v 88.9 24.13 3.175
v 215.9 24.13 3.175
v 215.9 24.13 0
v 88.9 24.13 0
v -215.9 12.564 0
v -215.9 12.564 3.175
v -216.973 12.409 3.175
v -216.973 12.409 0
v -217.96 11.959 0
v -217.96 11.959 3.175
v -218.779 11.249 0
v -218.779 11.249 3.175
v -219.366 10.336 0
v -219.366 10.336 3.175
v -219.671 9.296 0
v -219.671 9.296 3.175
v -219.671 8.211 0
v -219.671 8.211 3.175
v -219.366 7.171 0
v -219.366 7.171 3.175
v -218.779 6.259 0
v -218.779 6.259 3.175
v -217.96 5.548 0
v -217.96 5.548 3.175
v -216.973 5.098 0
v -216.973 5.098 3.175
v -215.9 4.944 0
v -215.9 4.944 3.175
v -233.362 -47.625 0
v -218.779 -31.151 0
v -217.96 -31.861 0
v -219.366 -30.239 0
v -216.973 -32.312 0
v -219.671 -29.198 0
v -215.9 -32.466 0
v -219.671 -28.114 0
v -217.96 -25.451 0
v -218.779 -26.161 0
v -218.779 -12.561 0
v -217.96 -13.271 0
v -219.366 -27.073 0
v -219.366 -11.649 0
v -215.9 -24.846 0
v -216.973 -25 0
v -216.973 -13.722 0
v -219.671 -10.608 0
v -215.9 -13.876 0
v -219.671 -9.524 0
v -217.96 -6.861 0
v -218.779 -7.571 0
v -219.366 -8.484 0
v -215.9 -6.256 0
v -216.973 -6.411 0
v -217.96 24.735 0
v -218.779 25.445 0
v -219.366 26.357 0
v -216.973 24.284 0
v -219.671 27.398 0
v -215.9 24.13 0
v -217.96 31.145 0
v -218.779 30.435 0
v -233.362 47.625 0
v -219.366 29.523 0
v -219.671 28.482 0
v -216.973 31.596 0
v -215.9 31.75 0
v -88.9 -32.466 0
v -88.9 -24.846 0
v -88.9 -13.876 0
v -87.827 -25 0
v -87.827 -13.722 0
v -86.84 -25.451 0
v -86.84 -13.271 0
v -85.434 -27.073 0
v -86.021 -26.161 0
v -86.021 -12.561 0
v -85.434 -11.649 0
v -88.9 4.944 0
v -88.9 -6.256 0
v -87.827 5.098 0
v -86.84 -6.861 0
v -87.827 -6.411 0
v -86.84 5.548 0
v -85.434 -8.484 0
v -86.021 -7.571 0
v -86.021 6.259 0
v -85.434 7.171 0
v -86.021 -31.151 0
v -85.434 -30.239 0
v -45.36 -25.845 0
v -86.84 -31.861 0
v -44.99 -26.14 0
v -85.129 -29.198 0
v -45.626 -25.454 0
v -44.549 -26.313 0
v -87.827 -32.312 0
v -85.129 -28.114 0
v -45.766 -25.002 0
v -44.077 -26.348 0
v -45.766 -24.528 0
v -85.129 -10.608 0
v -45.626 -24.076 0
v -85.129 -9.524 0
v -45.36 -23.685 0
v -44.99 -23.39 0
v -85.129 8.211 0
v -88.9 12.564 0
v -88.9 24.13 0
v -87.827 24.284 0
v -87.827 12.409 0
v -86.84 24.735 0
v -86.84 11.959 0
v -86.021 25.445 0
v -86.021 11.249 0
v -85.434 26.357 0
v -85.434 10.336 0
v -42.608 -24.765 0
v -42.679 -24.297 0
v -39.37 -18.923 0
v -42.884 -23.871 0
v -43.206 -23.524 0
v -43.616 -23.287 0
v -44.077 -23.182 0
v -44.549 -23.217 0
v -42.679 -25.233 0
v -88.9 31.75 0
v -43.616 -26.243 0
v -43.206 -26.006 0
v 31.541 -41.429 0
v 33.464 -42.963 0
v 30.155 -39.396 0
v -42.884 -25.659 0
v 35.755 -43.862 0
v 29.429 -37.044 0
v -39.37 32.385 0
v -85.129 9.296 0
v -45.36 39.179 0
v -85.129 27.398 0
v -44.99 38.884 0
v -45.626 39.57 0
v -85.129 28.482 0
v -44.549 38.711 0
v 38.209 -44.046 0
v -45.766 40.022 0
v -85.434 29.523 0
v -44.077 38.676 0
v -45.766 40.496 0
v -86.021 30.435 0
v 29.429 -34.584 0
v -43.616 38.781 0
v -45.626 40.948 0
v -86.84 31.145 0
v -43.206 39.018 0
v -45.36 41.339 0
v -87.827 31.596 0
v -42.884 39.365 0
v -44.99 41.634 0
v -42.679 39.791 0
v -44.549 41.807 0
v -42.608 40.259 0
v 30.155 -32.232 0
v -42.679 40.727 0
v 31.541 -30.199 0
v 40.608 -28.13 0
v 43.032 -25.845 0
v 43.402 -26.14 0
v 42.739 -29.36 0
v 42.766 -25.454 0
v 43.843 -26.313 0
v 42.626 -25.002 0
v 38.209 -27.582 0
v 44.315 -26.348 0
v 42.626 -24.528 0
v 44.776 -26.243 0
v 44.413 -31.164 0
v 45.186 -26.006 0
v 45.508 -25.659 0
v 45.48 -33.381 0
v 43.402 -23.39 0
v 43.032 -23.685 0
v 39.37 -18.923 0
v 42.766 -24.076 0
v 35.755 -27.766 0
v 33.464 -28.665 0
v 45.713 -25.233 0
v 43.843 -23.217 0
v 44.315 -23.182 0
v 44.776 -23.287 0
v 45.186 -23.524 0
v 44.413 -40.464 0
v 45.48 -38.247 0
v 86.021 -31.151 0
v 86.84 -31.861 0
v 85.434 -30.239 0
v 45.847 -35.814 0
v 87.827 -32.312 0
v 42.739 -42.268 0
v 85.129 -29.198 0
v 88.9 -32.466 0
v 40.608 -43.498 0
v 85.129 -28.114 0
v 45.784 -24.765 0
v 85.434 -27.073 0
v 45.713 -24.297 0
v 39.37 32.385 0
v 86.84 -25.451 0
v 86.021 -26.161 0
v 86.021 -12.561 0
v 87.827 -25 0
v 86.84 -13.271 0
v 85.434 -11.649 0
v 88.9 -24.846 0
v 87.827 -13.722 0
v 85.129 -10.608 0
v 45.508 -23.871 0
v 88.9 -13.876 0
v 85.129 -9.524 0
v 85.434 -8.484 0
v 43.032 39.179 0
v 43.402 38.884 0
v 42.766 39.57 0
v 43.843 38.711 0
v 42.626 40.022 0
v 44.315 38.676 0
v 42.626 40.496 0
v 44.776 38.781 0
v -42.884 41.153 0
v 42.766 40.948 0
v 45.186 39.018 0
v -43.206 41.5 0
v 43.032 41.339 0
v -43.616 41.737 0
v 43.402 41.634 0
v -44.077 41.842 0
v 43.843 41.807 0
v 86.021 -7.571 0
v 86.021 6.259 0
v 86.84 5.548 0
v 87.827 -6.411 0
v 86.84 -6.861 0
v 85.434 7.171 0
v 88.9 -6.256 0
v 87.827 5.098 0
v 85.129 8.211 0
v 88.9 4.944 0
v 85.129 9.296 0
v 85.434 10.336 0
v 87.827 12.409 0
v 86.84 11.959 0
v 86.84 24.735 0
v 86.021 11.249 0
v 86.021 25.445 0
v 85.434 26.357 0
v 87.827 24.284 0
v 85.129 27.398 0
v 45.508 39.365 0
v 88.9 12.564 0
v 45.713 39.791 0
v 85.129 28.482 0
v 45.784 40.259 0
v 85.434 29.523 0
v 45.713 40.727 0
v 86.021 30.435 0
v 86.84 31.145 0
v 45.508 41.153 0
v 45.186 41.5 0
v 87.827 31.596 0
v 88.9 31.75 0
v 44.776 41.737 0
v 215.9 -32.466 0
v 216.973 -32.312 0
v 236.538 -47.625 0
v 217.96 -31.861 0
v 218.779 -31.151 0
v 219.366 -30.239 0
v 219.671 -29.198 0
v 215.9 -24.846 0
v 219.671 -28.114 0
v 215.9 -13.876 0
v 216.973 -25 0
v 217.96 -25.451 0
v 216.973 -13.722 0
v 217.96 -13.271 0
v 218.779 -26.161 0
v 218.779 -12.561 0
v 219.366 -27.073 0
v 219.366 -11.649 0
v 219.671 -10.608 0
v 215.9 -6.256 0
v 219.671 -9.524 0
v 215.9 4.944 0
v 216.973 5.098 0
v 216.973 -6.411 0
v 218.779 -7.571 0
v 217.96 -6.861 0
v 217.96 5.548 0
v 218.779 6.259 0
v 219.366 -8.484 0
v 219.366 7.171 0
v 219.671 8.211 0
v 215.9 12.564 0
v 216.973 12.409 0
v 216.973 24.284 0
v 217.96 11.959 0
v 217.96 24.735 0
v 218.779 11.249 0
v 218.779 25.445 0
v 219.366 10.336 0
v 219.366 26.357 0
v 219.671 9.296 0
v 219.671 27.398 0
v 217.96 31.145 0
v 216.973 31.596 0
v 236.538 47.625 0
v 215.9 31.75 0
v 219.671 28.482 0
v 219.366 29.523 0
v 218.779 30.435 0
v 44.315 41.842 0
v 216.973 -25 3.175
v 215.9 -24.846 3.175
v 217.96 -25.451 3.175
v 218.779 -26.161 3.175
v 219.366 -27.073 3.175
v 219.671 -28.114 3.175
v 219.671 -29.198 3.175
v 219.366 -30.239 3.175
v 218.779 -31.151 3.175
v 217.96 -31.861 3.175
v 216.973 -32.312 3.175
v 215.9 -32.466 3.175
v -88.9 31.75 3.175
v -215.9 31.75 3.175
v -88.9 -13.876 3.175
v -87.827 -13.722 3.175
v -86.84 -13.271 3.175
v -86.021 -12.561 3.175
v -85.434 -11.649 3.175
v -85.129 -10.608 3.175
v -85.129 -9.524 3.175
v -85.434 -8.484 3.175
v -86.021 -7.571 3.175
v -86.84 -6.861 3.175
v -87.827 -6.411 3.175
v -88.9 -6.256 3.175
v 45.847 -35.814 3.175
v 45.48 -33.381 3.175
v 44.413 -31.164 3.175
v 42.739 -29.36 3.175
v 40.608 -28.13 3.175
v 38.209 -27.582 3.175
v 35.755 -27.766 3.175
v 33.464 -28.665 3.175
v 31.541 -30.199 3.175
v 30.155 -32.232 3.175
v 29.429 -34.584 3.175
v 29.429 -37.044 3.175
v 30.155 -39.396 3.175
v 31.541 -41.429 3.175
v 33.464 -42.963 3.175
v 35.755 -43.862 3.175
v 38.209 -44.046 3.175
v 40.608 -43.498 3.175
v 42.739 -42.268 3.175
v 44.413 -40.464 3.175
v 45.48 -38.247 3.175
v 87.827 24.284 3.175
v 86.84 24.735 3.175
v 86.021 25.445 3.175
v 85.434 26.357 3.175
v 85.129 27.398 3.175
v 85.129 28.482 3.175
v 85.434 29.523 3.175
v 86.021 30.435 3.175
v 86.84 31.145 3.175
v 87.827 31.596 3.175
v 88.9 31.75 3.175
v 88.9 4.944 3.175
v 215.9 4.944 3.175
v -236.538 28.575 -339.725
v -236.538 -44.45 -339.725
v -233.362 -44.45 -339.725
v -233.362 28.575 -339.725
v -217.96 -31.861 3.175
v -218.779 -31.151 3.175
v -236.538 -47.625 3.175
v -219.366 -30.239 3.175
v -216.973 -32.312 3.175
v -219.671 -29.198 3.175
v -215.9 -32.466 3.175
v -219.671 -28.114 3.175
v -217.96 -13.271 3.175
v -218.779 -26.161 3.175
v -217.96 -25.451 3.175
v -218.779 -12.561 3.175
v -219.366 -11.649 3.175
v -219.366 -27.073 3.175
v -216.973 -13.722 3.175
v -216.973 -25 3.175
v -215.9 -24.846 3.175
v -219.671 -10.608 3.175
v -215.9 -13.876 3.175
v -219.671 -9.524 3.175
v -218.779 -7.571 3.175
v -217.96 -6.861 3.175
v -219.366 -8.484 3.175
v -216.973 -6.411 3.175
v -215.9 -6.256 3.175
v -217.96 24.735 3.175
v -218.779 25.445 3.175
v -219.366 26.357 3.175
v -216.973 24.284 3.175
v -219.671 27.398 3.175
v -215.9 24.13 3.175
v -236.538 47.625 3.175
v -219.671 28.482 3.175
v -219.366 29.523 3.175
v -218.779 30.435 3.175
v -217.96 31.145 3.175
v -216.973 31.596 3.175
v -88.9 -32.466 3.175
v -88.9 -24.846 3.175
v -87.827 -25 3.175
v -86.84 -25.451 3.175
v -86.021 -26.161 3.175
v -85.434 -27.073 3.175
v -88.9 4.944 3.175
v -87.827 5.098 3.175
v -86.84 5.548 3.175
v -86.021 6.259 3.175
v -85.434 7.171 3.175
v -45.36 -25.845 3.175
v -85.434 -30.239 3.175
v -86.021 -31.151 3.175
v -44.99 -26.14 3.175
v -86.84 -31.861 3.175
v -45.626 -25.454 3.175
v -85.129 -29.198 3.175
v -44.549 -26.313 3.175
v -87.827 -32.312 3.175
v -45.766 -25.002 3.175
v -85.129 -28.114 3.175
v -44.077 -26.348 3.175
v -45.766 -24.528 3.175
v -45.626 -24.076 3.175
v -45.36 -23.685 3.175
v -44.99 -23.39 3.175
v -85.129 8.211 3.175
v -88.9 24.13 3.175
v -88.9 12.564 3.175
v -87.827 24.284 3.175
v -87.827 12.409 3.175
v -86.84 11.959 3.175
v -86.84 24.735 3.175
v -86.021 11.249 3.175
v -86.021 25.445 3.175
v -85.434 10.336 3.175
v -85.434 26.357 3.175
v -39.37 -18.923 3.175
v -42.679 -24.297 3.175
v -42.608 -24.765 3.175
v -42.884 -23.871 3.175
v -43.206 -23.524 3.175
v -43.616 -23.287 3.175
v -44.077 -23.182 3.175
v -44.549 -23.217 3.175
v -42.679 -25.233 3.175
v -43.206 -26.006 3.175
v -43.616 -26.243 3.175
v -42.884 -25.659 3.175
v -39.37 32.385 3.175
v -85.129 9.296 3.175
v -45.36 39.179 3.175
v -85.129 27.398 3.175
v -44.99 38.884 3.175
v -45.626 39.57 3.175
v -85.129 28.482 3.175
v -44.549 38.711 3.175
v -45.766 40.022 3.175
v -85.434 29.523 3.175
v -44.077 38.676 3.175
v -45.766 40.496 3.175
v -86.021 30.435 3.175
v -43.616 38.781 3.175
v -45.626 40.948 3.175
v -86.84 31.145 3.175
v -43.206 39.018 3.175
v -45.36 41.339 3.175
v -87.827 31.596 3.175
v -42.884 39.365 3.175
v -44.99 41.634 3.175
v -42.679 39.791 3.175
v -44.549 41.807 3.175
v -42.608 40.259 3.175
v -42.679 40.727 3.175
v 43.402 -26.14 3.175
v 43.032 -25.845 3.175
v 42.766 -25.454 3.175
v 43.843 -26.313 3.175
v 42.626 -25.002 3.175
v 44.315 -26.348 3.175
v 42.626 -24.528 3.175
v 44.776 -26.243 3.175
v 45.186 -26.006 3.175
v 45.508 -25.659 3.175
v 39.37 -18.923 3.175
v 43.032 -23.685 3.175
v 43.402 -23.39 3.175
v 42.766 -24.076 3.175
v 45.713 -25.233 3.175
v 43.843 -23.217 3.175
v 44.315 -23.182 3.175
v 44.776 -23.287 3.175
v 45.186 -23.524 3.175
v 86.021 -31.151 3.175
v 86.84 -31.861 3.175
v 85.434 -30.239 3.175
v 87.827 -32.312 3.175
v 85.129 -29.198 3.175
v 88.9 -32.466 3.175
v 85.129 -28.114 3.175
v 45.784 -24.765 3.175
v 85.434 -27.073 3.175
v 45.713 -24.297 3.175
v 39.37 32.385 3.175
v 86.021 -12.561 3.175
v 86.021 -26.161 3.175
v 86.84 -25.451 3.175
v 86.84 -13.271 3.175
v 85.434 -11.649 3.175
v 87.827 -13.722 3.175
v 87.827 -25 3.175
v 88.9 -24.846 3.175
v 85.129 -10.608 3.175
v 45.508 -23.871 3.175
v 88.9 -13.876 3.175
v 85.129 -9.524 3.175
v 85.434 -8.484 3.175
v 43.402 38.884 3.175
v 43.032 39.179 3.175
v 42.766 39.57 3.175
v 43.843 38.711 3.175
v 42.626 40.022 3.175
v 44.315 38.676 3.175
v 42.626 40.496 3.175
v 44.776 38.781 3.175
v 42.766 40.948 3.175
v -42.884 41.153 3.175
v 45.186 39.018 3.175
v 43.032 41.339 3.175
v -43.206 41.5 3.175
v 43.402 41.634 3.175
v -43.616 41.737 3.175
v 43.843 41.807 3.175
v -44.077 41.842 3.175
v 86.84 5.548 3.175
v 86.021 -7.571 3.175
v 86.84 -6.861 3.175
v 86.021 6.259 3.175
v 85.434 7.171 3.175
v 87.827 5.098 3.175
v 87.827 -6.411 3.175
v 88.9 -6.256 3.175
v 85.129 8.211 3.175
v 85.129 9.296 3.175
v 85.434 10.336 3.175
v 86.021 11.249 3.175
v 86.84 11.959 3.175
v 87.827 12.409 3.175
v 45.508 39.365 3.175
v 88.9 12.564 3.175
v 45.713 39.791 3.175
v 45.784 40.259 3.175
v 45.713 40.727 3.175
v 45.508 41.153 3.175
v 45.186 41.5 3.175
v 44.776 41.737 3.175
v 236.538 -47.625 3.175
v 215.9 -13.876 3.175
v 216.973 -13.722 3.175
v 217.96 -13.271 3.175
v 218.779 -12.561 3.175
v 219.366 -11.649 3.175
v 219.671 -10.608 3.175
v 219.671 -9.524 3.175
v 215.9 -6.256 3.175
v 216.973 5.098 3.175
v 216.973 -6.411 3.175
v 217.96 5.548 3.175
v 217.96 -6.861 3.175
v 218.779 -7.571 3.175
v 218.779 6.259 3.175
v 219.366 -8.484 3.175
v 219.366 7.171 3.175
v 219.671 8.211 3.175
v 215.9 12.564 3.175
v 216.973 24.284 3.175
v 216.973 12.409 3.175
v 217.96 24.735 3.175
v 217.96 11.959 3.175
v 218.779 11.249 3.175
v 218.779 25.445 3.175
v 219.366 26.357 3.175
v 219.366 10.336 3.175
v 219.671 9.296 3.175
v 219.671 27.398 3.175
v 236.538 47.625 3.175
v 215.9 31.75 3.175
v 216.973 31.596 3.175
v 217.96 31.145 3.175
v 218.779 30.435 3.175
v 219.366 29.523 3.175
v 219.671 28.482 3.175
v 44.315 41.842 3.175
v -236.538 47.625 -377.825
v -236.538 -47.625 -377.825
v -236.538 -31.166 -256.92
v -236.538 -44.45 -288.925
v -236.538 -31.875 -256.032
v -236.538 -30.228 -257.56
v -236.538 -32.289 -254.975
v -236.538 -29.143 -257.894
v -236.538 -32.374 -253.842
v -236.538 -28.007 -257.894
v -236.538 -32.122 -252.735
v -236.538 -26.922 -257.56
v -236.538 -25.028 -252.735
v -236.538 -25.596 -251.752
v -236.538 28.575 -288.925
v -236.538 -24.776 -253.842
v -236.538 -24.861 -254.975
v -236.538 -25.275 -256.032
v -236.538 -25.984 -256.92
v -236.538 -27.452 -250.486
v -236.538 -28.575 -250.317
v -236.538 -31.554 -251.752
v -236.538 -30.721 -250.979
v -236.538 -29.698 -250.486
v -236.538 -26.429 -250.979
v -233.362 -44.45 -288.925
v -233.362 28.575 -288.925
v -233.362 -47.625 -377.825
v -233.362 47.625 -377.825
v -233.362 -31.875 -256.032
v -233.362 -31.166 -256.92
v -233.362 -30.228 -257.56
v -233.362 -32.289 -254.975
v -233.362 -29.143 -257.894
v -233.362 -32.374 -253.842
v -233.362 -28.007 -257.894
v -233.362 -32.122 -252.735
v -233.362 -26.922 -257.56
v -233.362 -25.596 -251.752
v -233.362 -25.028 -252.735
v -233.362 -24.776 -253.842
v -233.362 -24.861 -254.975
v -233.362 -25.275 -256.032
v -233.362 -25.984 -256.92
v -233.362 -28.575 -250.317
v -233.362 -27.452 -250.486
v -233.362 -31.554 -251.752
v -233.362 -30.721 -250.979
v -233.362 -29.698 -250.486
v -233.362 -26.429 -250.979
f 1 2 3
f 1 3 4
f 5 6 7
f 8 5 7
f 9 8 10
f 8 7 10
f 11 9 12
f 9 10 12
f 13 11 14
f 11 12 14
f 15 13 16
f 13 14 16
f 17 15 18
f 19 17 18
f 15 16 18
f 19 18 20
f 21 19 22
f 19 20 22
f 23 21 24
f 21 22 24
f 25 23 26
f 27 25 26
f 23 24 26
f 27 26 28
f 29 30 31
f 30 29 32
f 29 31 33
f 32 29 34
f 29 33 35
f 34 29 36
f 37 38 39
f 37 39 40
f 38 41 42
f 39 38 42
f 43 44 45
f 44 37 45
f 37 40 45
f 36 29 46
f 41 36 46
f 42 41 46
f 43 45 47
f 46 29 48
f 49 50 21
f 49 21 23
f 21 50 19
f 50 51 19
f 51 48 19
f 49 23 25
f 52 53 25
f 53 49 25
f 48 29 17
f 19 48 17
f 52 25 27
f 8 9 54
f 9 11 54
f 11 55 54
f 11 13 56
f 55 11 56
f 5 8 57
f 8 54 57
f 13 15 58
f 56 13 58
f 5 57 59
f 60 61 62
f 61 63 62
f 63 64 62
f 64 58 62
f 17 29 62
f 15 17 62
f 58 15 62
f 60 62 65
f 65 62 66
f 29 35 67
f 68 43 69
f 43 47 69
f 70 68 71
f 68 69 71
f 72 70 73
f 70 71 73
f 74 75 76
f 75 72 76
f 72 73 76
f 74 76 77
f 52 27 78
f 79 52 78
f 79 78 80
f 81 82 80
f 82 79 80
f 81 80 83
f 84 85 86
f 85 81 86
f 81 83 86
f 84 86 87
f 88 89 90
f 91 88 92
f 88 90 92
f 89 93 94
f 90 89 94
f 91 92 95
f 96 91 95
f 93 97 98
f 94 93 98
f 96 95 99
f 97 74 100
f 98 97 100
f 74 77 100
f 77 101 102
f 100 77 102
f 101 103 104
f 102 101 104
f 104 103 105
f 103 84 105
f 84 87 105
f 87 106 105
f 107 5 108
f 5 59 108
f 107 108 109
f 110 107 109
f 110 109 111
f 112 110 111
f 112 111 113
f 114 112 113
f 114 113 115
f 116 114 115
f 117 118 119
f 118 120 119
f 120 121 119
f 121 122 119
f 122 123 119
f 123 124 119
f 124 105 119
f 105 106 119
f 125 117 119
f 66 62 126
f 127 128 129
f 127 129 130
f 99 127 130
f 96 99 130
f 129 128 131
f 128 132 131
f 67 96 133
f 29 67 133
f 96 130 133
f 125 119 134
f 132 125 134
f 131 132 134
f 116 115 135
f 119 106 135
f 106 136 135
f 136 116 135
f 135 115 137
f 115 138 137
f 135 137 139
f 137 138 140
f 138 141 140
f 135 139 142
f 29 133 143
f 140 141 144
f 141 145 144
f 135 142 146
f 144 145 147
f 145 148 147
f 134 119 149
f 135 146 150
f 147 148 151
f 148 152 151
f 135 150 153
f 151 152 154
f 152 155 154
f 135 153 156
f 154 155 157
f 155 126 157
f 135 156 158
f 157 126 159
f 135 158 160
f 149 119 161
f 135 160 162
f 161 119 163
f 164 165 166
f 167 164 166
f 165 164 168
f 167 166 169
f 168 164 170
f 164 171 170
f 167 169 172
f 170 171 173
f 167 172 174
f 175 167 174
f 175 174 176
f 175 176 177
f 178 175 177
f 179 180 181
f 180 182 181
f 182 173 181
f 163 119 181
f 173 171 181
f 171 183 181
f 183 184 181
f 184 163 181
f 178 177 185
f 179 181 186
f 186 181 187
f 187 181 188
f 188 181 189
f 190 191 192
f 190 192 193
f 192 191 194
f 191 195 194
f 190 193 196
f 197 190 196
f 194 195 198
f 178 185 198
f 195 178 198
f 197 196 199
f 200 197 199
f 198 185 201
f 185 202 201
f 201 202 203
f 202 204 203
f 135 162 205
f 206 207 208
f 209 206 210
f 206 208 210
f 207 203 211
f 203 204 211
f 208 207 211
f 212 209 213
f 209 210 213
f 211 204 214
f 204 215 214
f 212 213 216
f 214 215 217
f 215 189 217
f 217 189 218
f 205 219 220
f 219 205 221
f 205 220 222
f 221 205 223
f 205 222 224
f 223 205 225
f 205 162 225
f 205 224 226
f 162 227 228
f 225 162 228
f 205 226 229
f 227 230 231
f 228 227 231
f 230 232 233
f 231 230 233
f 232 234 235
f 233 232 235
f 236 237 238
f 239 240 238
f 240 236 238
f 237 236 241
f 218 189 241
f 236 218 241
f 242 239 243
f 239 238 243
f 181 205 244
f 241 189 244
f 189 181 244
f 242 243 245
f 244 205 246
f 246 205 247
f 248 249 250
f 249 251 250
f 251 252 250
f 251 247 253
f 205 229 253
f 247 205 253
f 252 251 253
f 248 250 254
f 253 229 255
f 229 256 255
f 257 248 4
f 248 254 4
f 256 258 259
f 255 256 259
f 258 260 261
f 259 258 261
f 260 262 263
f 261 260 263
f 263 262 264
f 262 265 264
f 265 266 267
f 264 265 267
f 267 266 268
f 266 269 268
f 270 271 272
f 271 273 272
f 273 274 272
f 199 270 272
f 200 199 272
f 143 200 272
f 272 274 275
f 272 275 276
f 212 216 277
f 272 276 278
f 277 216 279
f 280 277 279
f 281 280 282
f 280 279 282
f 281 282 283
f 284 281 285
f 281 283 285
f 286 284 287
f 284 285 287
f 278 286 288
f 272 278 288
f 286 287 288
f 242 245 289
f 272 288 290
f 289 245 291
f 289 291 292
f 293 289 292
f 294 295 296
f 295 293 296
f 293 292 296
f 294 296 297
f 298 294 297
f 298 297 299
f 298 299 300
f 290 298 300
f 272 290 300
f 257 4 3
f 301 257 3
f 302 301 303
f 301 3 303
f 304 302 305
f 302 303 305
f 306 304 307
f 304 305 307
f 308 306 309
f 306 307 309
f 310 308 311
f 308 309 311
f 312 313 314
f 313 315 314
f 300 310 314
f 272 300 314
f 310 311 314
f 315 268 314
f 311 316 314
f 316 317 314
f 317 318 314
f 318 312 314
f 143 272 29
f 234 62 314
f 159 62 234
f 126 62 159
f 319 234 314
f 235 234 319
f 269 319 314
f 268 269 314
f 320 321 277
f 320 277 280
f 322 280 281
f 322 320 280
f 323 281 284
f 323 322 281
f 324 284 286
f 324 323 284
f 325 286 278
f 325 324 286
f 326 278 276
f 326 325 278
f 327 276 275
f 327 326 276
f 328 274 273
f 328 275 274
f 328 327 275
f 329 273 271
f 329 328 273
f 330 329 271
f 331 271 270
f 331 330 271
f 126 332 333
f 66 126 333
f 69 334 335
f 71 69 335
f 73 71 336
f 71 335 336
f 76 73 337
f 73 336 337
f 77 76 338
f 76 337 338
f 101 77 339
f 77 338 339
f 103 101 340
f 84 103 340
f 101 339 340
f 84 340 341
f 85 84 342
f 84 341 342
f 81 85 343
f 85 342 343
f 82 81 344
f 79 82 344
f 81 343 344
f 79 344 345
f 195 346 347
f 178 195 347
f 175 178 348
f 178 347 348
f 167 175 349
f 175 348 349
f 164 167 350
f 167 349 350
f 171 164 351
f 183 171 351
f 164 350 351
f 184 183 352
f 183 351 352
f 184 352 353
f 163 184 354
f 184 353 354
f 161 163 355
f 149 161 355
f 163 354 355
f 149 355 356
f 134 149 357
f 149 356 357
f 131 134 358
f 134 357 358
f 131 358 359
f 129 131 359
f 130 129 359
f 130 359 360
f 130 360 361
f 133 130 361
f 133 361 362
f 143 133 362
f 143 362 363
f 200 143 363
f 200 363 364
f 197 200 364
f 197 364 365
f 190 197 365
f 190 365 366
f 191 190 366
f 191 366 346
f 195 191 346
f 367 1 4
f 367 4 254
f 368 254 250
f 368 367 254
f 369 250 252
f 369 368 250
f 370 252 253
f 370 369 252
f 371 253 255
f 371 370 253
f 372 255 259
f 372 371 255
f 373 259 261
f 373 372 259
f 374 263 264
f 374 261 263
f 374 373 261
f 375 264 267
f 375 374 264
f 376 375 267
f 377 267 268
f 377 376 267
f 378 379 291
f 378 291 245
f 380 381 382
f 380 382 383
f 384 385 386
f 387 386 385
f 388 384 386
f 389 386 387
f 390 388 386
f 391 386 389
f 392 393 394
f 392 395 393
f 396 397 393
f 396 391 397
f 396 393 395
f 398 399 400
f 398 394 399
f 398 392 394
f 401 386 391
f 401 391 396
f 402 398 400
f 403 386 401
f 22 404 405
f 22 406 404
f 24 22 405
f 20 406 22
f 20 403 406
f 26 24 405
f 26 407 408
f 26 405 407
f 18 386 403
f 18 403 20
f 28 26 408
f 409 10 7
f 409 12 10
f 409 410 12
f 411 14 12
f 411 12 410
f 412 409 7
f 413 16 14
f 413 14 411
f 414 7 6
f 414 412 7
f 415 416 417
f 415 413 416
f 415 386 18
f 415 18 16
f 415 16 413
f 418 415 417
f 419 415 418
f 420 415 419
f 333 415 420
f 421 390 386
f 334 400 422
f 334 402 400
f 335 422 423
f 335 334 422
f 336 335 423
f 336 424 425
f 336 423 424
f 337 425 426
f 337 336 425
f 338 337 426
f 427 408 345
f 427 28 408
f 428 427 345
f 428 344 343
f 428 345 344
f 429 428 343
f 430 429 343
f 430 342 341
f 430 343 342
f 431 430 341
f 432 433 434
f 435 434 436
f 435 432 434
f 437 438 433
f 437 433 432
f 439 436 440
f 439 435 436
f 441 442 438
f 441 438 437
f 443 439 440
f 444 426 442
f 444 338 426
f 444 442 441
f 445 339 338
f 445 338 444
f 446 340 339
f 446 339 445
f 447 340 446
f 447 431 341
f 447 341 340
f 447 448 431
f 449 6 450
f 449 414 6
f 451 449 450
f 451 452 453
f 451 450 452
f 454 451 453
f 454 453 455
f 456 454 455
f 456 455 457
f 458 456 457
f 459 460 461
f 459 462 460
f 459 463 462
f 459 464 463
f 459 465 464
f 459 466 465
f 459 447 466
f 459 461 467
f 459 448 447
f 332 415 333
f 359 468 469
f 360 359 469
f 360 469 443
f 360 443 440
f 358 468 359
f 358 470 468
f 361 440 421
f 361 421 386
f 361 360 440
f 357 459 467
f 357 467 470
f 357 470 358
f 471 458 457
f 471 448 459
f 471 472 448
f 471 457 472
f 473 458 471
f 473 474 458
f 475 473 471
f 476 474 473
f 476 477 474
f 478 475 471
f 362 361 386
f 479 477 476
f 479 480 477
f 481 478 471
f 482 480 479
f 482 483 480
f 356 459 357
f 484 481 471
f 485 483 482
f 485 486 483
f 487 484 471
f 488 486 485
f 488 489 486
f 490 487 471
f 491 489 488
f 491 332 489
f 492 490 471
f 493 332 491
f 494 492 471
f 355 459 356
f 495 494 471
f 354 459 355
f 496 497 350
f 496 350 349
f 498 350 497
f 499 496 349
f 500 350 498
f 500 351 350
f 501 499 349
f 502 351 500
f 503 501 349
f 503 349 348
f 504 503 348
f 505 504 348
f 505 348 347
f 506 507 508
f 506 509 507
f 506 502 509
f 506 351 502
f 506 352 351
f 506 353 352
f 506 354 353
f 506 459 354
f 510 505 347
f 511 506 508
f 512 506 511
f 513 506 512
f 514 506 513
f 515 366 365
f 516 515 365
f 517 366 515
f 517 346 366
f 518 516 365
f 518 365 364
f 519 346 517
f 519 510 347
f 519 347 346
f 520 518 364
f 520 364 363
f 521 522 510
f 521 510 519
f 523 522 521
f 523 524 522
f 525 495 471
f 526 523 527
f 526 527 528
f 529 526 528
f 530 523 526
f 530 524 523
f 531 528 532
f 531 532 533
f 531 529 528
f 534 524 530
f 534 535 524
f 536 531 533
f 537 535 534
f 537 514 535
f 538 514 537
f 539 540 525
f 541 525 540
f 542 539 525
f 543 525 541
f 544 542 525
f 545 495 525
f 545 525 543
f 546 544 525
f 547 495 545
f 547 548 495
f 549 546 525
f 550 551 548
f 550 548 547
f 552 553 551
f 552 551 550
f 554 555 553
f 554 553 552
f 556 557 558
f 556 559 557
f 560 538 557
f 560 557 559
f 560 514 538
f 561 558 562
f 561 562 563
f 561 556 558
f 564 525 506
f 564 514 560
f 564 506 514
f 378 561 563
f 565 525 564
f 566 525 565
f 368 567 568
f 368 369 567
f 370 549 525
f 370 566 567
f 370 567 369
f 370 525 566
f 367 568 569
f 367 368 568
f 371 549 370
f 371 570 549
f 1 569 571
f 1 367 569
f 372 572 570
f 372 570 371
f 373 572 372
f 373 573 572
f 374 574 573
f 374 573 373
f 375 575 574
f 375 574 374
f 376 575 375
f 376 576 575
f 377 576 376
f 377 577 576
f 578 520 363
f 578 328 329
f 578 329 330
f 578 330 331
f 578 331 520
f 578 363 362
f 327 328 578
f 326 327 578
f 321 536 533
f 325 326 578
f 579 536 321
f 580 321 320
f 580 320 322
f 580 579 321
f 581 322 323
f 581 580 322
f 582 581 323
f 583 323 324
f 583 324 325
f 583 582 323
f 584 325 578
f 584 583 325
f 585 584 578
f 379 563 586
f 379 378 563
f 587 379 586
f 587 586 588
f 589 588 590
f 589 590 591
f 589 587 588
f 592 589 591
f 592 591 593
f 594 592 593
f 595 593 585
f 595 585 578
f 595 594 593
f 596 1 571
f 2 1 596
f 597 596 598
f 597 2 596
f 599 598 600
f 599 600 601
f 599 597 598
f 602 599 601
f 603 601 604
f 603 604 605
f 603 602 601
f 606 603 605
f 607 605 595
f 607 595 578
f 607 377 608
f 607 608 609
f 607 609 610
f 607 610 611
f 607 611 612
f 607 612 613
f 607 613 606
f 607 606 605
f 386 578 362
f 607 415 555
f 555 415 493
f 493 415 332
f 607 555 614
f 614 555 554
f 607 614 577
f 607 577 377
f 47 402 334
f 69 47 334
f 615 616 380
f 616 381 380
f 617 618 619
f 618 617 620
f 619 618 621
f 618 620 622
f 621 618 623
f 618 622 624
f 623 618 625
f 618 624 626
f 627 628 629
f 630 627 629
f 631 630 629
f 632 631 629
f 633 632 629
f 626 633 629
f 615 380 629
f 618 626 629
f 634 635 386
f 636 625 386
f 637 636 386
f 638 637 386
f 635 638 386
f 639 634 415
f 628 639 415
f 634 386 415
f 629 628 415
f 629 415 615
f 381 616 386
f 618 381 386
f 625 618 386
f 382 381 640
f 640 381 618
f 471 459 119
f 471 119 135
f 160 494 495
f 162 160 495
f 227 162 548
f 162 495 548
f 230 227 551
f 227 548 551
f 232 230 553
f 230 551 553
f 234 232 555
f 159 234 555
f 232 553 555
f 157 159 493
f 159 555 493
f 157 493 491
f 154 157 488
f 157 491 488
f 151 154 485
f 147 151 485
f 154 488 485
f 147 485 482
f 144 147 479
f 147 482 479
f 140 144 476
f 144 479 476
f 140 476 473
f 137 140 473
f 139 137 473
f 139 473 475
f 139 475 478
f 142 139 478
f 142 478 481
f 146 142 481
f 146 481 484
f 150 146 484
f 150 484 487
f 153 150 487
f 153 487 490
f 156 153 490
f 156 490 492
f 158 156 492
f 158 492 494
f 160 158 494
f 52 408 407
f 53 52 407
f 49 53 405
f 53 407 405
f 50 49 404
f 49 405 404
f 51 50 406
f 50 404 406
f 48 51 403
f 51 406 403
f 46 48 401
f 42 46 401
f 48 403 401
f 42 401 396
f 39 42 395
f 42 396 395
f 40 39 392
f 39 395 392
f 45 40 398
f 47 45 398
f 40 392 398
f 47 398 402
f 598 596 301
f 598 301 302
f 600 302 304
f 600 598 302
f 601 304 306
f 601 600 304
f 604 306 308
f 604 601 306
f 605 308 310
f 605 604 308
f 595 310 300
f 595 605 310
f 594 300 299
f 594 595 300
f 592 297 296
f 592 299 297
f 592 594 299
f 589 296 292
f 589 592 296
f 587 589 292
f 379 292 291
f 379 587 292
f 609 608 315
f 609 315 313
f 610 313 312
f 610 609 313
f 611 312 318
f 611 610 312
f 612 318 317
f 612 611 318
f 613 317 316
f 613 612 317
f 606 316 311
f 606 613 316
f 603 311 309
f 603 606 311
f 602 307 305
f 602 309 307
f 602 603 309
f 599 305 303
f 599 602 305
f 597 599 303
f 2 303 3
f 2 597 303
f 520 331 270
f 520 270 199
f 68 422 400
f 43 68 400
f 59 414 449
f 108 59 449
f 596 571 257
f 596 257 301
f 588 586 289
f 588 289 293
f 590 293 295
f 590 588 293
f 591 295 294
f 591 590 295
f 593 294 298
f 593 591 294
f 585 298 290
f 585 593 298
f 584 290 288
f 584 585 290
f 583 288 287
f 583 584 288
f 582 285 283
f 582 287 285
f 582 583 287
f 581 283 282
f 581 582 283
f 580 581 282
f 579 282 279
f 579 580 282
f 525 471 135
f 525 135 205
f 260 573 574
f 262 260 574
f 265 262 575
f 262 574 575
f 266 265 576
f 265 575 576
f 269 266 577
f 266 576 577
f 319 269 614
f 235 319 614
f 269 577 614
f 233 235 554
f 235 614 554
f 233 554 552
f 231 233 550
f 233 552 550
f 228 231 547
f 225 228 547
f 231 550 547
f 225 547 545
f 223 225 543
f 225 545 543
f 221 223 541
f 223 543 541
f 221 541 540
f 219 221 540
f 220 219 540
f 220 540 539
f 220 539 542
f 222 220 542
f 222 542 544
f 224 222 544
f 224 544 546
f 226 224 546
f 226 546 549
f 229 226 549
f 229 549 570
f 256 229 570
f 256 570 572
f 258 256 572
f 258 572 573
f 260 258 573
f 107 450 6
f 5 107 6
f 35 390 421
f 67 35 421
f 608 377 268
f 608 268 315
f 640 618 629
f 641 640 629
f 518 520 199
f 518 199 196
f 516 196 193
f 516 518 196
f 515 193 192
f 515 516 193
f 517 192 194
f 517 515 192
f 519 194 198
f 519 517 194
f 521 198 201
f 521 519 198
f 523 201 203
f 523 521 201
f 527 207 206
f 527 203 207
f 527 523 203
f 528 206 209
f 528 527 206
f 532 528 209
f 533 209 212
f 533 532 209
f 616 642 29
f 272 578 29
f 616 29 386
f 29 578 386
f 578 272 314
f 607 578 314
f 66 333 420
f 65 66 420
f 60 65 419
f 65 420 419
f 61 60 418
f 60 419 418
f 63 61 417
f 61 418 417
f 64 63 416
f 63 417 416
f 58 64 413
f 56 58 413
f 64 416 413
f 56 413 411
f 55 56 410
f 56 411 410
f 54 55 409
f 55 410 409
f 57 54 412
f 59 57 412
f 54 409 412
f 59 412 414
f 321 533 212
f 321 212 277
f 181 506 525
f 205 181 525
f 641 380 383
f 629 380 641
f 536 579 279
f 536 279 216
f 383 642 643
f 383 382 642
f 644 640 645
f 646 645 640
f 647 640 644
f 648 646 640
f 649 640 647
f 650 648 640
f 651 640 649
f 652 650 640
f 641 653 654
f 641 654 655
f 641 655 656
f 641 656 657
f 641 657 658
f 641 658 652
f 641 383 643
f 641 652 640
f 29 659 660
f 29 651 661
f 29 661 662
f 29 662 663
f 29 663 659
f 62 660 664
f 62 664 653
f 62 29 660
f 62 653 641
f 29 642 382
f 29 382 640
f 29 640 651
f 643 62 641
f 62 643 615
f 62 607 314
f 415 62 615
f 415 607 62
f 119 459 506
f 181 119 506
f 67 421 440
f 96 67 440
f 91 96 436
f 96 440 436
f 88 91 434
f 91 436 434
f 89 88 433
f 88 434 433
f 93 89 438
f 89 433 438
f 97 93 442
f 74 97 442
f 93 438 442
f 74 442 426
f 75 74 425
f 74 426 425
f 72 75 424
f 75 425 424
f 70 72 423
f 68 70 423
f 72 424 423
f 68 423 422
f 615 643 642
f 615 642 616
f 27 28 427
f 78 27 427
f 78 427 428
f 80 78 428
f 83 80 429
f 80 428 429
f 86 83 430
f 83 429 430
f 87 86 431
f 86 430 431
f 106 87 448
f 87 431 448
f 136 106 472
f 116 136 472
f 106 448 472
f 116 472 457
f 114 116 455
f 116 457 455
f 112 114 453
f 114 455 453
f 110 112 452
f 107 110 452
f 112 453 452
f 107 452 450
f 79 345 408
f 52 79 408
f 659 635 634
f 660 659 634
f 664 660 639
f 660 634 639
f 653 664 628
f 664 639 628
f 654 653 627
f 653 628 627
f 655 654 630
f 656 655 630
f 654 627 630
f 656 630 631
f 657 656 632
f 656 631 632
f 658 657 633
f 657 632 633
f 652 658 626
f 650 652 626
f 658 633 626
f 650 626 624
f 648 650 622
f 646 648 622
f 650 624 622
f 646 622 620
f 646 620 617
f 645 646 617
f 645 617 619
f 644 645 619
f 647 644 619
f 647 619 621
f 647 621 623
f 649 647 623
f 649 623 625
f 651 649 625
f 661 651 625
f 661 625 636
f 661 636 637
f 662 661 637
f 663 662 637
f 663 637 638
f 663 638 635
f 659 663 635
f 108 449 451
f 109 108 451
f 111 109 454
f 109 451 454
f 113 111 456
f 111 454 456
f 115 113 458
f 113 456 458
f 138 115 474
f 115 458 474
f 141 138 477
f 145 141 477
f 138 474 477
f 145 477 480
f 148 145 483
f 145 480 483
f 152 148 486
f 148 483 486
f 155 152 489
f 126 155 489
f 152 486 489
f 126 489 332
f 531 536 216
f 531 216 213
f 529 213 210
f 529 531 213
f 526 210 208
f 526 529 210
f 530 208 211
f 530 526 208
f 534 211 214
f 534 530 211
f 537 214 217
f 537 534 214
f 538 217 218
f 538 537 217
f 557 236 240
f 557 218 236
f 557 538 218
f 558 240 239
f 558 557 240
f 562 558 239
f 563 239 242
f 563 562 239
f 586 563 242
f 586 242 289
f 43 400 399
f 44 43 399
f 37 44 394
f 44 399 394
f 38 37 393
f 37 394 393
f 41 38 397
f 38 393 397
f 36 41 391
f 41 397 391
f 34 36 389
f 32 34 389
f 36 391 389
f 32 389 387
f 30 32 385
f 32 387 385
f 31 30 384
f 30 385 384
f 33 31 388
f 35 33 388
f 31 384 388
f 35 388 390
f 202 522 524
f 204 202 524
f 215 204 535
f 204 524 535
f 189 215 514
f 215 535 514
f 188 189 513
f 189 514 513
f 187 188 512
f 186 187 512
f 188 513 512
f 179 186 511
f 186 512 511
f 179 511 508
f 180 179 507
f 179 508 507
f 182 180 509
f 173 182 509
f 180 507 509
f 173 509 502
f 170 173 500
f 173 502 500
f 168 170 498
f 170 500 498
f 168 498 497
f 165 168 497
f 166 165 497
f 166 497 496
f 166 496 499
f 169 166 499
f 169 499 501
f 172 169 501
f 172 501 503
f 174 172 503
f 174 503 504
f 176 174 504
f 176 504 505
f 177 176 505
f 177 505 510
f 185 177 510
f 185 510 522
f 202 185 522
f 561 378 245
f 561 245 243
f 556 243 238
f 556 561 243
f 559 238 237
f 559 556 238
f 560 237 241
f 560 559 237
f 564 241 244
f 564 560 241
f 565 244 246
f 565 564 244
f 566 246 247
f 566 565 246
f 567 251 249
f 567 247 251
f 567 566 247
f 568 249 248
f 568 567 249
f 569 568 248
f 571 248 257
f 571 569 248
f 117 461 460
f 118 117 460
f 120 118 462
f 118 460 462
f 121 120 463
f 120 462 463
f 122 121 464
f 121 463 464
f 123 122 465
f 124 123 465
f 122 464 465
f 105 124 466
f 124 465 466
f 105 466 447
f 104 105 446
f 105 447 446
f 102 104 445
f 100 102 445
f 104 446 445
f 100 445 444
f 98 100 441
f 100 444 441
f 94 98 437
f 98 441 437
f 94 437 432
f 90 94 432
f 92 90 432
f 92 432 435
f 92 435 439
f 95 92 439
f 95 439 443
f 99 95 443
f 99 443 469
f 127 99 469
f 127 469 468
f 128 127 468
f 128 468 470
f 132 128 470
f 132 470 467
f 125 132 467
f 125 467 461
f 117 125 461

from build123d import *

# Parameters (mm, degrees)
SKETCH1_W           = 473.075
SKETCH1_H           = 95.25
BOSS_EXTRUDE1_DEPTH = 3.175
SKETCH3_W           = 78.74
SKETCH3_H           = 51.308
CUT_EXTRUDE2_DEPTH  = 242.305221983
SKETCH4_R           = 8.255
CUT_EXTRUDE3_DEPTH  = 242.305221983
SKETCH5_R           = 1.5875
CUT_EXTRUDE4_DEPTH  = 242.305221983
SKETCH6_W           = 3.175
SKETCH6_H           = 95.25
BOSS_EXTRUDE2_DEPTH = 377.825
SKETCH7_R           = 3.81
SKETCH7_W           = 50.8
SKETCH7_H           = 73.025
CUT_EXTRUDE5_DEPTH  = 381
CUT_EXTRUDE6_DEPTH  = 381


with BuildPart() as part:
    # Sketch1 → Boss-Extrude1 (new body)
    with BuildSketch(Plane.XY):
        Rectangle(SKETCH1_W, SKETCH1_H)
    extrude(amount=BOSS_EXTRUDE1_DEPTH)

    # Sketch3 → Cut-Extrude2 (cut, through all)
    with BuildSketch(Plane.XY.offset(3.175)):
        with Locations((0, 6.731)):
            Rectangle(SKETCH3_W, SKETCH3_H)
    extrude(amount=-CUT_EXTRUDE2_DEPTH, mode=Mode.SUBTRACT)

    # Sketch4 → Cut-Extrude3 (cut, through all)
    with BuildSketch(Plane.XY.offset(3.175)):
        with Locations((37.592, -35.814)):
            Circle(SKETCH4_R)
    extrude(amount=-CUT_EXTRUDE3_DEPTH, mode=Mode.SUBTRACT)

    # Sketch5 → Cut-Extrude4 (cut, through all)
    with BuildSketch(Plane.XY.offset(3.175)):
        with Locations((44.196, 40.259)):
            Circle(SKETCH5_R)
        with Locations((44.196, -24.765)):
            Circle(SKETCH5_R)
        with Locations((-44.196, -24.765)):
            Circle(SKETCH5_R)
        with Locations((-44.196, 40.259)):
            Circle(SKETCH5_R)
    extrude(amount=-CUT_EXTRUDE4_DEPTH, mode=Mode.SUBTRACT)

    # Sketch6 → Boss-Extrude2 (add)
    with BuildSketch(Plane(origin=(0, 0, 0), x_dir=(-1, 0, 0), z_dir=(0, 0, -1))):
        with Locations((234.95, 0)):
            Rectangle(SKETCH6_W, SKETCH6_H)
    extrude(amount=BOSS_EXTRUDE2_DEPTH)

    # Sketch7 → Cut-Extrude5 (cut)
    with BuildSketch(Plane.ZY.offset(236.5375)):
        with Locations((-254.127, -28.575)):
            Circle(SKETCH7_R)
        with Locations((-314.325, -7.9375)):
            Rectangle(SKETCH7_W, SKETCH7_H)
    extrude(amount=-CUT_EXTRUDE5_DEPTH, mode=Mode.SUBTRACT)

    # Sketch8 → Cut-Extrude6 (cut)
    with BuildSketch(Plane.XY.offset(3.175)):
        with BuildLine():
            Line((215.9, 31.75), (88.9, 31.75))
            ThreePointArc((88.9, 31.75), (85.09, 27.94), (88.9, 24.13))
            Line((88.9, 24.13), (215.9, 24.13))
            ThreePointArc((215.9, 24.13), (219.71, 27.94), (215.9, 31.75))
        make_face()
        with BuildLine():
            Line((215.9, 12.563594852), (88.9, 12.563594852))
            ThreePointArc((88.9, 12.563594852), (85.09, 8.753594852), (88.9, 4.943594852))
            Line((88.9, 4.943594852), (215.9, 4.943594852))
            ThreePointArc((215.9, 4.943594852), (219.71, 8.753594852), (215.9, 12.563594852))
        make_face()
        with BuildLine():
            Line((215.9, -6.256272006), (88.9, -6.256272006))
            ThreePointArc((88.9, -6.256272006), (85.09, -10.066272006), (88.9, -13.876272006))
            Line((88.9, -13.876272006), (215.9, -13.876272006))
            ThreePointArc((215.9, -13.876272006), (219.71, -10.066272006), (215.9, -6.256272006))
        make_face()
        with BuildLine():
            Line((215.9, -24.84600572), (88.9, -24.84600572))
            ThreePointArc((88.9, -24.84600572), (85.09, -28.65600572), (88.9, -32.46600572))
            Line((88.9, -32.46600572), (215.9, -32.46600572))
            ThreePointArc((215.9, -32.46600572), (219.71, -28.65600572), (215.9, -24.84600572))
        make_face()
        with BuildLine():
            ThreePointArc((-88.9, -32.46600572), (-85.09, -28.65600572), (-88.9, -24.84600572))
            Line((-88.9, -24.84600572), (-215.9, -24.84600572))
            ThreePointArc((-215.9, -24.84600572), (-219.71, -28.65600572), (-215.9, -32.46600572))
            Line((-215.9, -32.46600572), (-88.9, -32.46600572))
        make_face()
        with BuildLine():
            ThreePointArc((-88.9, -13.876272006), (-85.09, -10.066272006), (-88.9, -6.256272006))
            Line((-88.9, -6.256272006), (-215.9, -6.256272006))
            ThreePointArc((-215.9, -6.256272006), (-219.71, -10.066272006), (-215.9, -13.876272006))
            Line((-215.9, -13.876272006), (-88.9, -13.876272006))
        make_face()
        with BuildLine():
            ThreePointArc((-88.9, 4.943594852), (-85.09, 8.753594852), (-88.9, 12.563594852))
            Line((-88.9, 12.563594852), (-215.9, 12.563594852))
            ThreePointArc((-215.9, 12.563594852), (-219.71, 8.753594852), (-215.9, 4.943594852))
            Line((-215.9, 4.943594852), (-88.9, 4.943594852))
        make_face()
        with BuildLine():
            ThreePointArc((-88.9, 24.13), (-85.09, 27.94), (-88.9, 31.75))
            Line((-88.9, 31.75), (-215.9, 31.75))
            ThreePointArc((-215.9, 31.75), (-219.71, 27.94), (-215.9, 24.13))
            Line((-215.9, 24.13), (-88.9, 24.13))
        make_face()
    extrude(amount=-CUT_EXTRUDE6_DEPTH, mode=Mode.SUBTRACT)


solid = part.part
